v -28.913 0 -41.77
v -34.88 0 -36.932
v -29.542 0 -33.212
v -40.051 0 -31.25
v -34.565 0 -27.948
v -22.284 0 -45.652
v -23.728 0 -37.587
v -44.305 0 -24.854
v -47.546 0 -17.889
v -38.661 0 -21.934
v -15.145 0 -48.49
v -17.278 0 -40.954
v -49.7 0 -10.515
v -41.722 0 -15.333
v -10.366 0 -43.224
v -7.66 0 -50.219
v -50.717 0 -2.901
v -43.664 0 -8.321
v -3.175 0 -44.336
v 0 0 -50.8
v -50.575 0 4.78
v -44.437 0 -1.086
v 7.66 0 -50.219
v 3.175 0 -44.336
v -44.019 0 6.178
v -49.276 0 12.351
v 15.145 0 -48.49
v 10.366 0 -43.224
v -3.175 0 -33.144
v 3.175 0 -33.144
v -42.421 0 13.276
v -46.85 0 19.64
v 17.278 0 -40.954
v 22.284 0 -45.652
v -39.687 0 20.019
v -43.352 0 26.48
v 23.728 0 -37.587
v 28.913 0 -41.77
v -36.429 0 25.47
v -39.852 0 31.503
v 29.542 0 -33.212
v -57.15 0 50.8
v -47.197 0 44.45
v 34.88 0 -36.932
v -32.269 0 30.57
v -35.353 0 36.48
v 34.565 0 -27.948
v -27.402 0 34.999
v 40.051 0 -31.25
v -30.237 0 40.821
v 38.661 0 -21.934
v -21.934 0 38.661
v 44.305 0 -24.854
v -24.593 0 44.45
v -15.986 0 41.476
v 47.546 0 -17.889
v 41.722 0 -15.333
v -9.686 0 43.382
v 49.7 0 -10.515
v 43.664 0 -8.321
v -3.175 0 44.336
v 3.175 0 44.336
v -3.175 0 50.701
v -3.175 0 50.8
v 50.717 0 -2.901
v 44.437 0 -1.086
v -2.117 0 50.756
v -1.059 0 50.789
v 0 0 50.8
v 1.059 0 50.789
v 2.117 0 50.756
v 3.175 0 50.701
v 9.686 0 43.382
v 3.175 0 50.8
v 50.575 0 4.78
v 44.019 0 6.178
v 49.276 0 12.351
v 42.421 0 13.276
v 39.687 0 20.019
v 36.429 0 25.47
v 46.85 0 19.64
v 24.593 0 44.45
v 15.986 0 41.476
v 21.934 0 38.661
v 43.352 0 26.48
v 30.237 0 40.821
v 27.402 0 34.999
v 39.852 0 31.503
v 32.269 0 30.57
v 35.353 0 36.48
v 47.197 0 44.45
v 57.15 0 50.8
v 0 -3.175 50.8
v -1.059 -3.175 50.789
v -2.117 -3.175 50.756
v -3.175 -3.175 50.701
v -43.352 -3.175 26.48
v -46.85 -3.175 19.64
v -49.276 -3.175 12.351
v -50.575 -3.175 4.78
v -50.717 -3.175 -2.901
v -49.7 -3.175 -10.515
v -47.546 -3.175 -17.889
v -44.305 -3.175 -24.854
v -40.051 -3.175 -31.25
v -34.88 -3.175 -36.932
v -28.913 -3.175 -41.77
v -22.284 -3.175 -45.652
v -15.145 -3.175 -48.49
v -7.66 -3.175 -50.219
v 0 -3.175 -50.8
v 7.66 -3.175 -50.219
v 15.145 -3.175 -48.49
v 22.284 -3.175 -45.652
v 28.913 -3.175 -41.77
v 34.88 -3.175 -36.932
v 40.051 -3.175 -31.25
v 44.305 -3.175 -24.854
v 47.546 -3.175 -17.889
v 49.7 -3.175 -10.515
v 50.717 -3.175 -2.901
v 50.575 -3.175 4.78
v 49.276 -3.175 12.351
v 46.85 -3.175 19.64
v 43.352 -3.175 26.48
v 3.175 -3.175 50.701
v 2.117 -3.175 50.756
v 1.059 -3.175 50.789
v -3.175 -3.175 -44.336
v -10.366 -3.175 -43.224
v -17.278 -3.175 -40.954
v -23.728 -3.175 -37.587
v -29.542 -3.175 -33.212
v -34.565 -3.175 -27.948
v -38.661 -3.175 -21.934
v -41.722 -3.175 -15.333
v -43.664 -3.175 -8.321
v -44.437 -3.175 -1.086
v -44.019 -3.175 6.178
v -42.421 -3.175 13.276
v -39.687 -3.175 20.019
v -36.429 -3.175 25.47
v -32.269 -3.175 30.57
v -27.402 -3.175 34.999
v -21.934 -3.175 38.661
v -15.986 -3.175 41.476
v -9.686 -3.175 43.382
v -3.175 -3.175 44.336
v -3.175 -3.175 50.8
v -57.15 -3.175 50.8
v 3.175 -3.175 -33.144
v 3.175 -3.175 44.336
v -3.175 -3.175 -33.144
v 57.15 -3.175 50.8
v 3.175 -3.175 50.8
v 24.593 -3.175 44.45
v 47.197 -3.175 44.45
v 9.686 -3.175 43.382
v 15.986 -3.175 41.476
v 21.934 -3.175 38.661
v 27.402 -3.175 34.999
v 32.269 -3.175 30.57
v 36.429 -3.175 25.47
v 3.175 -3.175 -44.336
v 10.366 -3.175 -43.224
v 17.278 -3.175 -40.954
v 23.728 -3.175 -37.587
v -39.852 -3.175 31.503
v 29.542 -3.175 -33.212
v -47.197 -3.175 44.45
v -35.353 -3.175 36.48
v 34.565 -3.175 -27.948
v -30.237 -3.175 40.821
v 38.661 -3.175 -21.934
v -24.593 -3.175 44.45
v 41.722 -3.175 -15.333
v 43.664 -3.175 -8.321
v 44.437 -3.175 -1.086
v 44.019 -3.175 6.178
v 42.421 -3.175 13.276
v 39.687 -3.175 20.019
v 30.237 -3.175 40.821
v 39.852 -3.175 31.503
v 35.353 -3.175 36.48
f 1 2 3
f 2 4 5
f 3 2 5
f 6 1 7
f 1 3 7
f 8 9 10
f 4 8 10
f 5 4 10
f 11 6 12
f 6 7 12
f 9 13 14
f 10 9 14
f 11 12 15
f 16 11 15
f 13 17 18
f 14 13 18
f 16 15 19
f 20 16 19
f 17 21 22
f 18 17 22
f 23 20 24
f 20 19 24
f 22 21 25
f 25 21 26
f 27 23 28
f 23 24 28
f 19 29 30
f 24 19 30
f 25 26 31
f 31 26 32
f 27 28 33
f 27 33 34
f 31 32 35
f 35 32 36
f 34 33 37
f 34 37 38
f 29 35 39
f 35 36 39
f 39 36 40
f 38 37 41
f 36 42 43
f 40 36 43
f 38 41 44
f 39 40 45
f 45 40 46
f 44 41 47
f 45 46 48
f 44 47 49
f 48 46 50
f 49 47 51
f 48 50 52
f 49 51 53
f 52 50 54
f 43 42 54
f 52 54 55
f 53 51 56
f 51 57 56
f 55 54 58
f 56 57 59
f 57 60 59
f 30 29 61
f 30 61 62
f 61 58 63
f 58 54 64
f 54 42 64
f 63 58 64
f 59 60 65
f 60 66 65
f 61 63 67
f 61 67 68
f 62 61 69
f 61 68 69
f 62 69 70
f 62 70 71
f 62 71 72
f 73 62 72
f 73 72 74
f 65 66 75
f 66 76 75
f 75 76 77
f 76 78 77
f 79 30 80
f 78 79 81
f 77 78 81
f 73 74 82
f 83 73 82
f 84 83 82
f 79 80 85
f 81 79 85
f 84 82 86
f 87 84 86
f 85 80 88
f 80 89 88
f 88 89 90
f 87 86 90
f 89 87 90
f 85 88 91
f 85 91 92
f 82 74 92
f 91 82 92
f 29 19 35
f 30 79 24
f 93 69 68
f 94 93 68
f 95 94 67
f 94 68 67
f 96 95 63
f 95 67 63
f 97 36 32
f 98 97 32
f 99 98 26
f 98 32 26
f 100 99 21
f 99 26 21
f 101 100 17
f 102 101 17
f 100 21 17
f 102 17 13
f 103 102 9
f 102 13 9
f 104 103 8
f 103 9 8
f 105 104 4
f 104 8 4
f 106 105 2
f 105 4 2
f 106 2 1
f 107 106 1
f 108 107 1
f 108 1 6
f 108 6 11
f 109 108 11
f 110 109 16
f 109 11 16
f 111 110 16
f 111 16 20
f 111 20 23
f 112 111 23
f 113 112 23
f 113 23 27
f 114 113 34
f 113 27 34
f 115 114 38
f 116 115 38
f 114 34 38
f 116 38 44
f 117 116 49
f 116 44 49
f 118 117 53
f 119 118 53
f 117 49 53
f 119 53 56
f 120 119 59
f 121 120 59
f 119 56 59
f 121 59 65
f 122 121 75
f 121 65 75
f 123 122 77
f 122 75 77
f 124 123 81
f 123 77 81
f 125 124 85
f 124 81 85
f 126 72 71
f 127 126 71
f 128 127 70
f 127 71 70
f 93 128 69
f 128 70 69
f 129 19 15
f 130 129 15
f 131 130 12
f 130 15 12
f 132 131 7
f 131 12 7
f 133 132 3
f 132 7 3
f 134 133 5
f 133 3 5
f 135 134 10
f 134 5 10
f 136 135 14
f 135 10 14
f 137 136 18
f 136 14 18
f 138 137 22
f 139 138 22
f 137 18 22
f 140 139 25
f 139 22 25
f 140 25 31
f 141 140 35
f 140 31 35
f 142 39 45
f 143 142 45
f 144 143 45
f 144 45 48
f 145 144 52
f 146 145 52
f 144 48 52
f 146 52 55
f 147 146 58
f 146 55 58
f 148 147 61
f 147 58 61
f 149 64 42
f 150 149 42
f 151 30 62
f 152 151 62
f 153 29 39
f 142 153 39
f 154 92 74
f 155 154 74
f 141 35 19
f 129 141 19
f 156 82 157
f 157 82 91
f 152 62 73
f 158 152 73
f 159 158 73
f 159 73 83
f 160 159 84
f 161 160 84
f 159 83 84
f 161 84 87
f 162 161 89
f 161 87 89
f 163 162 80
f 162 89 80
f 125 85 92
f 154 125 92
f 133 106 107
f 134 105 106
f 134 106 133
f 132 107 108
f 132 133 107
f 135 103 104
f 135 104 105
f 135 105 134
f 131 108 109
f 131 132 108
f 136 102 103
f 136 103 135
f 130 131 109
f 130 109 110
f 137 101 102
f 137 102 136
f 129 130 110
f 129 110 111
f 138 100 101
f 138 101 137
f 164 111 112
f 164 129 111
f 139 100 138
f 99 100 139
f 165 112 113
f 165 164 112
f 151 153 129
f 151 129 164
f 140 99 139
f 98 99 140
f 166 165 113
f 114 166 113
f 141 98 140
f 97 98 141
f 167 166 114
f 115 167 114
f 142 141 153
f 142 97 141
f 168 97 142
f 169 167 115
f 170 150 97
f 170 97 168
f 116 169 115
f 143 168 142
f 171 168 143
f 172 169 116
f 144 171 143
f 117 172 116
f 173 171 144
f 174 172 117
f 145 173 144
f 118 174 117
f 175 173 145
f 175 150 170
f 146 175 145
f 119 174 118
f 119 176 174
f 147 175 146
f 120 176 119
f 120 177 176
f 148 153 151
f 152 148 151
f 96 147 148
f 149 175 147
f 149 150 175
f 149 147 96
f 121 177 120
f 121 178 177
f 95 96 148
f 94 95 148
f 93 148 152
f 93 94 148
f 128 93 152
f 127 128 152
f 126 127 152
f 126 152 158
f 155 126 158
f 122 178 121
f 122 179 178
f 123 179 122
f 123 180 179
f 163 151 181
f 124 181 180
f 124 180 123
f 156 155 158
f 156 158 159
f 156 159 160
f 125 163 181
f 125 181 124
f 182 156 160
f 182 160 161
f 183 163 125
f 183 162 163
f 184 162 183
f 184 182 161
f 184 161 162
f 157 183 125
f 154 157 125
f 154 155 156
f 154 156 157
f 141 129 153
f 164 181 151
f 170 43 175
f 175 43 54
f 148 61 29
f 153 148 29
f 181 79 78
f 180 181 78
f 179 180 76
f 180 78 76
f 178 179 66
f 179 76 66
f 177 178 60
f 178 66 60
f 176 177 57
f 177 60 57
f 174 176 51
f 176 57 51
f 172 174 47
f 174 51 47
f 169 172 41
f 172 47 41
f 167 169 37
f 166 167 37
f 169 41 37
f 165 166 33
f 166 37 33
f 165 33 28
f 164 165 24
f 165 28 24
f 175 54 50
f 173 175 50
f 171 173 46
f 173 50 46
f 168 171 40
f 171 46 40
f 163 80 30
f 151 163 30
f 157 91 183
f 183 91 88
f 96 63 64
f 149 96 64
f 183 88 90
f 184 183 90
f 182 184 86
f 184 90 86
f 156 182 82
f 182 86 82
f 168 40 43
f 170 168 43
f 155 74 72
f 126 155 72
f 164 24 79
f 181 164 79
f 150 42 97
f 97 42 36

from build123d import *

# Parameters (mm, degrees)
F1_DEPTH = 3.175


# Not quite as in the source:
# - a length typed as a fraction of an inch, garbled in the dataset ("3 / 203.2 mm" for 3/8 in), is restored


with BuildPart() as f1:
    # F0 (on Front) → F1 (new body)
    with BuildSketch(Plane.XZ):
        with BuildLine():
            ThreePointArc((-43.3524121445, 26.4803391454), (-44.3048599399, -24.8539611673), (0, -50.8))
            ThreePointArc((0, -50.8), (44.3048599399, -24.8539611673), (43.3524121445, 26.4803391454))
            Line((43.3524121445, 26.4803391454), (57.15, 50.8))
            Line((57.15, 50.8), (50.8, 50.8))
            Line((50.8, 50.8), (3.175, 50.8))
            Line((3.175, 50.8), (3.175, 50.700684167))
            ThreePointArc((3.175, 50.700684167), (1.5882764743, 50.7751649711), (0, 50.8))
            ThreePointArc((0, 50.8), (-1.5882764743, 50.7751649711), (-3.175, 50.700684167))
            Line((-3.175, 50.700684167), (-3.175, 50.8))
            Line((-3.175, 50.8), (-50.8, 50.8))
            Line((-50.8, 50.8), (-57.15, 50.8))
            Line((-57.15, 50.8), (-43.3524121445, 26.4803391454))
        make_face()
        with BuildLine():
            Line((-39.6867141727, 20.0191712658), (-3.175, -44.336462139))
            ThreePointArc((-3.175, -44.336462139), (-38.6612664458, -21.9341965162), (-39.6867141727, 20.0191712658))
        make_face(mode=Mode.SUBTRACT)
        with BuildLine():
            ThreePointArc((39.6867141727, 20.0191712658), (38.6612664458, -21.9341965162), (3.175, -44.336462139))
            Line((3.175, -44.336462139), (39.6867141727, 20.0191712658))
        make_face(mode=Mode.SUBTRACT)
        with BuildLine():
            ThreePointArc((-36.429171038, 25.4699430208), (-21.9341965162, 38.6612664458), (-3.175, 44.336462139))
            Line((-3.175, 44.336462139), (-3.175, -33.1439371814))
            Line((-3.175, -33.1439371814), (-36.429171038, 25.4699430208))
        make_face(mode=Mode.SUBTRACT)
        with BuildLine():
            Line((-47.1973723398, 44.45), (-24.5934442484, 44.45))
            ThreePointArc((-24.5934442484, 44.45), (-32.8665744068, 38.7353622258), (-39.8520903437, 31.5031886519))
            Line((-39.8520903437, 31.5031886519), (-47.1973723398, 44.45))
        make_face(mode=Mode.SUBTRACT)
        with BuildLine():
            Line((3.175, -33.1439371814), (3.175, 44.336462139))
            ThreePointArc((3.175, 44.336462139), (21.9341965162, 38.6612664458), (36.429171038, 25.4699430208))
            Line((36.429171038, 25.4699430208), (3.175, -33.1439371814))
        make_face(mode=Mode.SUBTRACT)
        with BuildLine():
            ThreePointArc((39.8520903437, 31.5031886519), (32.8665744068, 38.7353622258), (24.5934442484, 44.45))
            Line((24.5934442484, 44.45), (47.1973723398, 44.45))
            Line((47.1973723398, 44.45), (39.8520903437, 31.5031886519))
        make_face(mode=Mode.SUBTRACT)
    extrude(amount=F1_DEPTH)


solid = f1.part
